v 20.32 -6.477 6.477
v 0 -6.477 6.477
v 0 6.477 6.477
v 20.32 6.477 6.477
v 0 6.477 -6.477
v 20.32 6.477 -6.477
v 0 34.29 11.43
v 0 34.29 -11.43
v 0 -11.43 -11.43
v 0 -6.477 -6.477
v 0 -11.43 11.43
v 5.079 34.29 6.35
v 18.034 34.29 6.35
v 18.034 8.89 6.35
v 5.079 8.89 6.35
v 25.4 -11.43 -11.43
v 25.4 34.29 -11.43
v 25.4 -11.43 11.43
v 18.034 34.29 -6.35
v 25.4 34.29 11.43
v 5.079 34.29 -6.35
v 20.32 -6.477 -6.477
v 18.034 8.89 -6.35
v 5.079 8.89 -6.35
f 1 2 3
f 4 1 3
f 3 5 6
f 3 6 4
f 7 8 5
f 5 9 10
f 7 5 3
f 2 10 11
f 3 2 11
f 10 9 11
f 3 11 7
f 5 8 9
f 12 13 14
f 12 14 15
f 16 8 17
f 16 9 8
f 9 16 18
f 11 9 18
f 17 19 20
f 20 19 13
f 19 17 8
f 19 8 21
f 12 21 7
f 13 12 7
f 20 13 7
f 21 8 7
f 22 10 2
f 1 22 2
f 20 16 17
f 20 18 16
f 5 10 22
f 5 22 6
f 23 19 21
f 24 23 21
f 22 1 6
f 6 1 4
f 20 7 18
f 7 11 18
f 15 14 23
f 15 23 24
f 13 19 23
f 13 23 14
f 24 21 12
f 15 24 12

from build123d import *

# Parameters (mm, degrees)
F0_W     = 22.86
F0_H     = 22.86
F0_W_2   = 12.954
F0_H_2   = 12.954
F1_DEPTH = 25.4
F2_DEPTH = 22.86
F3_W     = 12.954
F3_H     = 12.954
F4_DEPTH = 5.08
F5_W     = 12.9547669124
F5_H     = 12.7
F6_DEPTH = 25.4


with BuildPart() as f1:
    # F0 (on Right) → F1 (new body)
    with BuildSketch(Plane.YZ):
        Rectangle(F0_W, F0_H)
        Rectangle(F0_W_2, F0_H_2, mode=Mode.SUBTRACT)
    extrude(amount=F1_DEPTH)

    # F2 (add): a face of the model
    f2_faces = [f1.faces().sort_by_distance(p)[0] for p in [
        (12.7, 11.43, 0),
    ]]
    extrude(f2_faces, amount=F2_DEPTH)

    # F3 (on face) → F4 (join)
    with BuildSketch(Plane.YZ.offset(25.4)):
        Rectangle(F3_W, F3_H)
    extrude(amount=-F4_DEPTH)

    # F5 (on face) → F6 (cut)
    with BuildSketch(Plane(origin=(0, 34.29, 0), x_dir=(-1, 0, 0), z_dir=(0, 1, 0))):
        with Locations((-11.5566165438, 0)):
            Rectangle(F5_W, F5_H)
    extrude(amount=-F6_DEPTH, mode=Mode.SUBTRACT)


solid = f1.part
